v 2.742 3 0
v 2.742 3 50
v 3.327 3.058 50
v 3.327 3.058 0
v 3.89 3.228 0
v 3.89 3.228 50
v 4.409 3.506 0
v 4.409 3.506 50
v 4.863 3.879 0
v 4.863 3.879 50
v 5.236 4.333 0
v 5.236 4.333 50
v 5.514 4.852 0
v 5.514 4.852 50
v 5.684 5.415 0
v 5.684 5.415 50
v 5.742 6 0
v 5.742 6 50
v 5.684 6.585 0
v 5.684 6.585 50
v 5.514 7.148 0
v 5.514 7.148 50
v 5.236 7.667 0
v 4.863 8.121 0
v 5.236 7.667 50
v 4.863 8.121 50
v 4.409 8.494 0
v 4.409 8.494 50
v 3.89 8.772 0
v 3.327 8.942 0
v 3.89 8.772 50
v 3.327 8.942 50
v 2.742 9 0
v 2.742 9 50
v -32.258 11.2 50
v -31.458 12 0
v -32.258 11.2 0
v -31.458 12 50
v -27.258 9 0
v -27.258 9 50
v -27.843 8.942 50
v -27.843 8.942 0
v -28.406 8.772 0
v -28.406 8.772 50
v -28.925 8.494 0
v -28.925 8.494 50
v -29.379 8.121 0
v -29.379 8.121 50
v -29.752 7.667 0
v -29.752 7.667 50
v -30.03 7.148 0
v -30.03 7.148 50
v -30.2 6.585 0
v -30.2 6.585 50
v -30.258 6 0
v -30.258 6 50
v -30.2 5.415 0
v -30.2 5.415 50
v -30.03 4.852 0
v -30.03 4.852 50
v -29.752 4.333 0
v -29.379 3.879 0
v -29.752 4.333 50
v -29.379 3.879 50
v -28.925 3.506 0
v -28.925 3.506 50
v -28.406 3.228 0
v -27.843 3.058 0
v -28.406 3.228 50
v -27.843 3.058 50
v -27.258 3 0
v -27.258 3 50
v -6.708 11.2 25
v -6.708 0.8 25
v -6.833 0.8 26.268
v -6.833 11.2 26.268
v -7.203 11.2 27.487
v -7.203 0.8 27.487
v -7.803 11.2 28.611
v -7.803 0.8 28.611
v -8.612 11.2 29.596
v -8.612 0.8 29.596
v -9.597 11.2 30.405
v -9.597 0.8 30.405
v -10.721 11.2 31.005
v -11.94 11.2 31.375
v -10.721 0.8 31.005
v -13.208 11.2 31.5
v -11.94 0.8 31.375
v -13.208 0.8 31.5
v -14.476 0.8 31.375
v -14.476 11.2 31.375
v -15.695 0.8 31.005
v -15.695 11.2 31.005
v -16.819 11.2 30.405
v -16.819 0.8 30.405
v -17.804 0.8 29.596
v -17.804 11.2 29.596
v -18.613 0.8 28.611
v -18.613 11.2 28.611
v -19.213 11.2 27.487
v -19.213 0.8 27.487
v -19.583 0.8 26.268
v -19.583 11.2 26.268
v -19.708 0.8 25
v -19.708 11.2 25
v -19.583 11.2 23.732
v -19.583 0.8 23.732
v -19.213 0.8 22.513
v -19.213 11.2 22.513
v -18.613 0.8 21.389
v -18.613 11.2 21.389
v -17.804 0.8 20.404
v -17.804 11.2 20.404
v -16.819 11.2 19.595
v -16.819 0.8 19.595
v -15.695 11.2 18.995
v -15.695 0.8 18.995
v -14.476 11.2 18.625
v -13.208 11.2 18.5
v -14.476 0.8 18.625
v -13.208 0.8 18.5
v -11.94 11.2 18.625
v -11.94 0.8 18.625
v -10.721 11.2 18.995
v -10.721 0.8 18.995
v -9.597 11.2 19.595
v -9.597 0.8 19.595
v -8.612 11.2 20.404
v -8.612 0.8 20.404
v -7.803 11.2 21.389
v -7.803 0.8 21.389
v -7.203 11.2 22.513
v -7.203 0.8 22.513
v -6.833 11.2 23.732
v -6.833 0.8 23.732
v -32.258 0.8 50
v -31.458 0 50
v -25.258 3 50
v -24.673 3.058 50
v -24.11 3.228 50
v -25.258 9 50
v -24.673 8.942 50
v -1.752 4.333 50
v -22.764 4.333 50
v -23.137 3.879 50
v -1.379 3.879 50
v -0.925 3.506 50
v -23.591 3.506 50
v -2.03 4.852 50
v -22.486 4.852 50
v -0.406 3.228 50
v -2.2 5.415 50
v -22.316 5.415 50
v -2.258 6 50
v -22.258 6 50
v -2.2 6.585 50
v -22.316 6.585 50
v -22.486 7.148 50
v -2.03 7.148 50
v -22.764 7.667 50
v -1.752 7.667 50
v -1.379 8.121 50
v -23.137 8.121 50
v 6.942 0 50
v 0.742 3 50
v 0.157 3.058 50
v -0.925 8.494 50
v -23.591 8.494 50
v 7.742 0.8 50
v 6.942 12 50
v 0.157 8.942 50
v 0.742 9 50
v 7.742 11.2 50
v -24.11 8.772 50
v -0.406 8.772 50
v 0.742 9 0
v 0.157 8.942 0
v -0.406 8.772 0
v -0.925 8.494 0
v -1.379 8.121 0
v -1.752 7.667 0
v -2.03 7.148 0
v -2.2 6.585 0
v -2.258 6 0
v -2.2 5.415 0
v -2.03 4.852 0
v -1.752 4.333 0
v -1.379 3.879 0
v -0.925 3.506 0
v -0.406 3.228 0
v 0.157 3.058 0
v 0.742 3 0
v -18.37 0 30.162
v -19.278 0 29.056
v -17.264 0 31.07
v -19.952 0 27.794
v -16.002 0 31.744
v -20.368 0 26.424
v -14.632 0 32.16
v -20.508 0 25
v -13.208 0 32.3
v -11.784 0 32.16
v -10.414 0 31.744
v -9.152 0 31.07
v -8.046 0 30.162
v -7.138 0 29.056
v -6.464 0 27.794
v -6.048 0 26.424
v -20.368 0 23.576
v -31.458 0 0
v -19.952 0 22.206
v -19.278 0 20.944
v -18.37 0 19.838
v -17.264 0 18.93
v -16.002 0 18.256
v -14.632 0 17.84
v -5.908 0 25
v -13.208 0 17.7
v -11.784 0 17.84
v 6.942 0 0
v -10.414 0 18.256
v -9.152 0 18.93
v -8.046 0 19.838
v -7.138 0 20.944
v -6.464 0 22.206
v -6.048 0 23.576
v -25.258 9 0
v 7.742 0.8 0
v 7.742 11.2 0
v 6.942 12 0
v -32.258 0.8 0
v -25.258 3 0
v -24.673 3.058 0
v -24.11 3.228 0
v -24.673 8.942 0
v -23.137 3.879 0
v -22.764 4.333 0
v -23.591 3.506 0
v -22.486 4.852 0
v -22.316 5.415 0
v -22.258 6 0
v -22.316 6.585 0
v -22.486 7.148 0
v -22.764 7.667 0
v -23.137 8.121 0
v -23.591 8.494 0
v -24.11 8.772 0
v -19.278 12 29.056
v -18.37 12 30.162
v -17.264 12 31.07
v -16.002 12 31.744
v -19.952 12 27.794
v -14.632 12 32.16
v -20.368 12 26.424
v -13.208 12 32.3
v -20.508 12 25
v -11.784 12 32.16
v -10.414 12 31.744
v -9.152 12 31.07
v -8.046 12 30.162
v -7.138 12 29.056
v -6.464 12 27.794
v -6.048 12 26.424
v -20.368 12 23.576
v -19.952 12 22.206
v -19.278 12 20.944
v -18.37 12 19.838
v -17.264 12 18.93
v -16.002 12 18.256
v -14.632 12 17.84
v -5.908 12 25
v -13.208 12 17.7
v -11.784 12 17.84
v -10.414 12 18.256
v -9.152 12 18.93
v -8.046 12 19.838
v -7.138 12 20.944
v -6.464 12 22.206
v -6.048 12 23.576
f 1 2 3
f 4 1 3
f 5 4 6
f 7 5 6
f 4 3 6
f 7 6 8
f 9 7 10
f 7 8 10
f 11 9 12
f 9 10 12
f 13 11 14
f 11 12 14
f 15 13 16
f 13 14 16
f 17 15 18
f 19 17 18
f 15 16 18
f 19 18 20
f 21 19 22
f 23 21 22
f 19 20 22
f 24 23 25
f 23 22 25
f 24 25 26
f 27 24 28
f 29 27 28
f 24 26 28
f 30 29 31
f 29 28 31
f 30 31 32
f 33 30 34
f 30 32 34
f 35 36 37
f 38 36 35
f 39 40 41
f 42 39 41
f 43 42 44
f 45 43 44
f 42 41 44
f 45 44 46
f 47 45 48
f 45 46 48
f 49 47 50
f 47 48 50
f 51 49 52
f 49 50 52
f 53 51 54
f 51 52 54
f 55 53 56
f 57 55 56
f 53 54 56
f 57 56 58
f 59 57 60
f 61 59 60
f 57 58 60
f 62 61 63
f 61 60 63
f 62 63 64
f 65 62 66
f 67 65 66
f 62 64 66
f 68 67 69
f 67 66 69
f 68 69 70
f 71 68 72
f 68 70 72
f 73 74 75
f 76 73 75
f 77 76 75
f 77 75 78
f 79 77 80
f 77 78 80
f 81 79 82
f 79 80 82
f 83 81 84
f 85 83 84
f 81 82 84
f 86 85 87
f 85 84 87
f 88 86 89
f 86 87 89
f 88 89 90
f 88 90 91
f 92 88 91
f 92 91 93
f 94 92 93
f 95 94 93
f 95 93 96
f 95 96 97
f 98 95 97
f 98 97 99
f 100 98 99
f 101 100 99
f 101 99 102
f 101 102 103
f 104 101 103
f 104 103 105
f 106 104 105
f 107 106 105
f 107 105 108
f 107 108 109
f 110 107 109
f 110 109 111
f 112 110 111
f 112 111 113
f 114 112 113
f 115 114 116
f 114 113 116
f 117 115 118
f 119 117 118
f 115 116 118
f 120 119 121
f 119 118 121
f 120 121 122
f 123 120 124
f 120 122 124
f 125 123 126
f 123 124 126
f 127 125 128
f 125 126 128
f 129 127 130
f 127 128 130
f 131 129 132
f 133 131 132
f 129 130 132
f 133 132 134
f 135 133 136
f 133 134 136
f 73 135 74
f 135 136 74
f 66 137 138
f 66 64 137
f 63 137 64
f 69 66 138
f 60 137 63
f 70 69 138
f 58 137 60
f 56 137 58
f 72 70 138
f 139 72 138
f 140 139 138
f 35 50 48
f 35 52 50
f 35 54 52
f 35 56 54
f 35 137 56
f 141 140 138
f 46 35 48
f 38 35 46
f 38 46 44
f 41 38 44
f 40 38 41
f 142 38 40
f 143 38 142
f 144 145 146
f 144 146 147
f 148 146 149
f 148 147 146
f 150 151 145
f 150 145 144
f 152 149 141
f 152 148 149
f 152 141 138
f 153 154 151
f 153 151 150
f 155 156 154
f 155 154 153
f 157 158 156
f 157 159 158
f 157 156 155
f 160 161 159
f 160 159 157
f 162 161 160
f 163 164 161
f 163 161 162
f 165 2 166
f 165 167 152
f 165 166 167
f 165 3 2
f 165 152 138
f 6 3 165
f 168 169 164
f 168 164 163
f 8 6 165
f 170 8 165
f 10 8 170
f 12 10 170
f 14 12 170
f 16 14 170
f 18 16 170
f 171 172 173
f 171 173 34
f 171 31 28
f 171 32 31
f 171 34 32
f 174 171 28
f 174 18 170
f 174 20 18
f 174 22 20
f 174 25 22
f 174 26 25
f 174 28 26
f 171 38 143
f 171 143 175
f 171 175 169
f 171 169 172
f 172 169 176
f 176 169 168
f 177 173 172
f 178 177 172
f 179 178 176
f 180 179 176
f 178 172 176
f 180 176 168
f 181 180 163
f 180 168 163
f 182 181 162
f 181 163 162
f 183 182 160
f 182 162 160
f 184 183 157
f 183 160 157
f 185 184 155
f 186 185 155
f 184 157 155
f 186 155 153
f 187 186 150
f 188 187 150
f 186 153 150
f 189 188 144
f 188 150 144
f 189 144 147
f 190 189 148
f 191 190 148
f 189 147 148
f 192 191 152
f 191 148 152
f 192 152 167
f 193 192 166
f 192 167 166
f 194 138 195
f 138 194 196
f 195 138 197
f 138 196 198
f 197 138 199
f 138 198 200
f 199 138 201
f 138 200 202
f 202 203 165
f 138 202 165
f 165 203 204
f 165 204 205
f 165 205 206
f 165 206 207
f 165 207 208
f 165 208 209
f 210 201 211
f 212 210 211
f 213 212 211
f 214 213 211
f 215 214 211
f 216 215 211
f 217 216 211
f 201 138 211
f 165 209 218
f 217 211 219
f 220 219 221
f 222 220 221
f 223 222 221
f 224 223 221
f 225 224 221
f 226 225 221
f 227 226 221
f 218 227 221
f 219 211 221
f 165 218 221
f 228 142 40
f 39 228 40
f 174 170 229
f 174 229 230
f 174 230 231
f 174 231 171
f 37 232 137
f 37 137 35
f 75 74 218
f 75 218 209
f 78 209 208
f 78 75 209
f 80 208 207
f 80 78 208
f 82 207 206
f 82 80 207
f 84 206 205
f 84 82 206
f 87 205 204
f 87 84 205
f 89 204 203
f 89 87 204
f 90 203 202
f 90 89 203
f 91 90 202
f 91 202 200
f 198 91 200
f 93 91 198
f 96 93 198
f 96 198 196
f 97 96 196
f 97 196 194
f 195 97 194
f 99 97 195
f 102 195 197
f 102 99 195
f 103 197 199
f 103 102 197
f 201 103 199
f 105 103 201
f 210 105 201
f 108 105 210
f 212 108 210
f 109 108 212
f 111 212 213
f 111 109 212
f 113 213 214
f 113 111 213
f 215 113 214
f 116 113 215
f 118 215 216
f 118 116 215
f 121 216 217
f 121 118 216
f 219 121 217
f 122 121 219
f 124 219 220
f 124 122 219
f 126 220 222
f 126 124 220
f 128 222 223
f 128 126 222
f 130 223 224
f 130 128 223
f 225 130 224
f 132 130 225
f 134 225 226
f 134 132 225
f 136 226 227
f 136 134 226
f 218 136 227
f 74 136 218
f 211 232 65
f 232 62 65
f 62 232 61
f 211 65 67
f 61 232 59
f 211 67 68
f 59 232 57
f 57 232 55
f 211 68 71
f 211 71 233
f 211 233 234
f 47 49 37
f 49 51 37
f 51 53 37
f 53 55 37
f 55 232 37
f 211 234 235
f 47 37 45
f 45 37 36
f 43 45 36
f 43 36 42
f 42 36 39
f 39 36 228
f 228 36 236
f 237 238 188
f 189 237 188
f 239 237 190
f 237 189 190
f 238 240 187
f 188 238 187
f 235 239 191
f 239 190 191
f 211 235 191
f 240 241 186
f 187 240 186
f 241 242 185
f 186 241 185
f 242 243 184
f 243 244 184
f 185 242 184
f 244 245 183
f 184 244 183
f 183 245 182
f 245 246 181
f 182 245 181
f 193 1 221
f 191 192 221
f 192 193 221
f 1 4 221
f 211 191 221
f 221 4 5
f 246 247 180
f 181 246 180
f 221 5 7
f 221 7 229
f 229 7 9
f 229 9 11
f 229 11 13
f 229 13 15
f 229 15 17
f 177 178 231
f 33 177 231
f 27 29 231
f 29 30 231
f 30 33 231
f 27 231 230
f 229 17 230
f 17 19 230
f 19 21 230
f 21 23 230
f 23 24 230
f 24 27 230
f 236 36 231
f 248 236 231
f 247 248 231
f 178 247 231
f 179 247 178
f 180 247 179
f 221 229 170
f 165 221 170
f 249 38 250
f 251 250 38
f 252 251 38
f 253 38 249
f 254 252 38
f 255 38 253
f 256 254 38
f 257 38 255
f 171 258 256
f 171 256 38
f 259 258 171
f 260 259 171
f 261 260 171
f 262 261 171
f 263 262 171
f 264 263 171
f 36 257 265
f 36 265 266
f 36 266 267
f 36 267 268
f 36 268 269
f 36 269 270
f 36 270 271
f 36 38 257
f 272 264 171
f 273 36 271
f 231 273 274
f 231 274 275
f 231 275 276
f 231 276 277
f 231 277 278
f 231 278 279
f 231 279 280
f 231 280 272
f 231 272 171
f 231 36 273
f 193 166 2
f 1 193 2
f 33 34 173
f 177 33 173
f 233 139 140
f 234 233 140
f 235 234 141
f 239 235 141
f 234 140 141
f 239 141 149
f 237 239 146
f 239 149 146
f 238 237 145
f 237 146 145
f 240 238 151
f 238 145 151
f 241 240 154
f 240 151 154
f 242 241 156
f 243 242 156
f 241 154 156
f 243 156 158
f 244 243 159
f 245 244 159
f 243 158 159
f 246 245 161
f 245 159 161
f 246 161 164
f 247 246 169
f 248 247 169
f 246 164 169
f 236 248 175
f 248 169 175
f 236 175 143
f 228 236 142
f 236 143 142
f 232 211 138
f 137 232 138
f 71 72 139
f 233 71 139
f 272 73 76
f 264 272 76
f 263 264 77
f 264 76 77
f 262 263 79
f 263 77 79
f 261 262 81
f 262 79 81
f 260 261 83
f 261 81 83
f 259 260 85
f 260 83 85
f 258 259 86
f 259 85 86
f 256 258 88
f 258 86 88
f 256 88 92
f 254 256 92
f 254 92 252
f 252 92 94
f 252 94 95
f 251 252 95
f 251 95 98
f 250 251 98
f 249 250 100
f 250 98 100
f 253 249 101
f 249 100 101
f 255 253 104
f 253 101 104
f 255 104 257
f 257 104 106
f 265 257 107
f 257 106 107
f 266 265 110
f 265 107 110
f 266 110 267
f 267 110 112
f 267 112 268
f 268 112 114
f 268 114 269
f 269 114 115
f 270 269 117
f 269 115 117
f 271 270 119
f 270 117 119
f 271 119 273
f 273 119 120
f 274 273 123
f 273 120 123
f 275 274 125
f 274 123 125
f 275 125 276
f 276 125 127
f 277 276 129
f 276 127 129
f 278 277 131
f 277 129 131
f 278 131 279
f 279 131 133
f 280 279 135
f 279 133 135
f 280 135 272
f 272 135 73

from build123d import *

# Parameters (mm, degrees)
F0_W     = 40
F0_H     = 12
F1_DEPTH = 50
F3_DEPTH = 55
F4_R     = 6.5
F5_DEPTH = 13
F6_SIZE  = 0.8


# Not quite as in the source:
# - a feature names something its author has since deleted; it is built from what else it names


with BuildPart() as f1:
    # F0 (on Top) → F1 (new body)
    with BuildSketch(Plane.XY):
        with Locations((-12.258, 6)):
            Rectangle(F0_W, F0_H)
    extrude(amount=F1_DEPTH)

    # F2 (on face) → F3 (cut)
    with BuildSketch(Plane.XY.offset(50)):
        with BuildLine():
            Line((-25.258, 9), (-27.258, 9))
            ThreePointArc((-27.258, 9), (-30.258, 6), (-27.258, 3))
            Line((-27.258, 3), (-25.258, 3))
            ThreePointArc((-25.258, 3), (-22.258, 6), (-25.258, 9))
        make_face()
        with BuildLine():
            Line((0.742, 3), (2.742, 3))
            ThreePointArc((2.742, 3), (5.742, 6), (2.742, 9))
            Line((2.742, 9), (0.742, 9))
            ThreePointArc((0.742, 9), (-2.258, 6), (0.742, 3))
        make_face()
    extrude(amount=-F3_DEPTH, mode=Mode.SUBTRACT)

    # F4 (on face) → F5 (cut)
    with BuildSketch(Plane.XZ):
        with Locations((-13.208, 25)):
            Circle(F4_R)
    extrude(amount=-F5_DEPTH, mode=Mode.SUBTRACT)

    # F6
    f6_edges = [f1.edges().sort_by_distance(p)[0] for p in [
        (7.742, 0, 25),
        (-32.258, 12, 25),
        (-32.258, 0, 25),
        (-19.708, 12, 25),
        (-19.708, 0, 25),
        (7.742, 12, 25),
    ]]
    chamfer(f6_edges, length=F6_SIZE)


solid = f1.part
